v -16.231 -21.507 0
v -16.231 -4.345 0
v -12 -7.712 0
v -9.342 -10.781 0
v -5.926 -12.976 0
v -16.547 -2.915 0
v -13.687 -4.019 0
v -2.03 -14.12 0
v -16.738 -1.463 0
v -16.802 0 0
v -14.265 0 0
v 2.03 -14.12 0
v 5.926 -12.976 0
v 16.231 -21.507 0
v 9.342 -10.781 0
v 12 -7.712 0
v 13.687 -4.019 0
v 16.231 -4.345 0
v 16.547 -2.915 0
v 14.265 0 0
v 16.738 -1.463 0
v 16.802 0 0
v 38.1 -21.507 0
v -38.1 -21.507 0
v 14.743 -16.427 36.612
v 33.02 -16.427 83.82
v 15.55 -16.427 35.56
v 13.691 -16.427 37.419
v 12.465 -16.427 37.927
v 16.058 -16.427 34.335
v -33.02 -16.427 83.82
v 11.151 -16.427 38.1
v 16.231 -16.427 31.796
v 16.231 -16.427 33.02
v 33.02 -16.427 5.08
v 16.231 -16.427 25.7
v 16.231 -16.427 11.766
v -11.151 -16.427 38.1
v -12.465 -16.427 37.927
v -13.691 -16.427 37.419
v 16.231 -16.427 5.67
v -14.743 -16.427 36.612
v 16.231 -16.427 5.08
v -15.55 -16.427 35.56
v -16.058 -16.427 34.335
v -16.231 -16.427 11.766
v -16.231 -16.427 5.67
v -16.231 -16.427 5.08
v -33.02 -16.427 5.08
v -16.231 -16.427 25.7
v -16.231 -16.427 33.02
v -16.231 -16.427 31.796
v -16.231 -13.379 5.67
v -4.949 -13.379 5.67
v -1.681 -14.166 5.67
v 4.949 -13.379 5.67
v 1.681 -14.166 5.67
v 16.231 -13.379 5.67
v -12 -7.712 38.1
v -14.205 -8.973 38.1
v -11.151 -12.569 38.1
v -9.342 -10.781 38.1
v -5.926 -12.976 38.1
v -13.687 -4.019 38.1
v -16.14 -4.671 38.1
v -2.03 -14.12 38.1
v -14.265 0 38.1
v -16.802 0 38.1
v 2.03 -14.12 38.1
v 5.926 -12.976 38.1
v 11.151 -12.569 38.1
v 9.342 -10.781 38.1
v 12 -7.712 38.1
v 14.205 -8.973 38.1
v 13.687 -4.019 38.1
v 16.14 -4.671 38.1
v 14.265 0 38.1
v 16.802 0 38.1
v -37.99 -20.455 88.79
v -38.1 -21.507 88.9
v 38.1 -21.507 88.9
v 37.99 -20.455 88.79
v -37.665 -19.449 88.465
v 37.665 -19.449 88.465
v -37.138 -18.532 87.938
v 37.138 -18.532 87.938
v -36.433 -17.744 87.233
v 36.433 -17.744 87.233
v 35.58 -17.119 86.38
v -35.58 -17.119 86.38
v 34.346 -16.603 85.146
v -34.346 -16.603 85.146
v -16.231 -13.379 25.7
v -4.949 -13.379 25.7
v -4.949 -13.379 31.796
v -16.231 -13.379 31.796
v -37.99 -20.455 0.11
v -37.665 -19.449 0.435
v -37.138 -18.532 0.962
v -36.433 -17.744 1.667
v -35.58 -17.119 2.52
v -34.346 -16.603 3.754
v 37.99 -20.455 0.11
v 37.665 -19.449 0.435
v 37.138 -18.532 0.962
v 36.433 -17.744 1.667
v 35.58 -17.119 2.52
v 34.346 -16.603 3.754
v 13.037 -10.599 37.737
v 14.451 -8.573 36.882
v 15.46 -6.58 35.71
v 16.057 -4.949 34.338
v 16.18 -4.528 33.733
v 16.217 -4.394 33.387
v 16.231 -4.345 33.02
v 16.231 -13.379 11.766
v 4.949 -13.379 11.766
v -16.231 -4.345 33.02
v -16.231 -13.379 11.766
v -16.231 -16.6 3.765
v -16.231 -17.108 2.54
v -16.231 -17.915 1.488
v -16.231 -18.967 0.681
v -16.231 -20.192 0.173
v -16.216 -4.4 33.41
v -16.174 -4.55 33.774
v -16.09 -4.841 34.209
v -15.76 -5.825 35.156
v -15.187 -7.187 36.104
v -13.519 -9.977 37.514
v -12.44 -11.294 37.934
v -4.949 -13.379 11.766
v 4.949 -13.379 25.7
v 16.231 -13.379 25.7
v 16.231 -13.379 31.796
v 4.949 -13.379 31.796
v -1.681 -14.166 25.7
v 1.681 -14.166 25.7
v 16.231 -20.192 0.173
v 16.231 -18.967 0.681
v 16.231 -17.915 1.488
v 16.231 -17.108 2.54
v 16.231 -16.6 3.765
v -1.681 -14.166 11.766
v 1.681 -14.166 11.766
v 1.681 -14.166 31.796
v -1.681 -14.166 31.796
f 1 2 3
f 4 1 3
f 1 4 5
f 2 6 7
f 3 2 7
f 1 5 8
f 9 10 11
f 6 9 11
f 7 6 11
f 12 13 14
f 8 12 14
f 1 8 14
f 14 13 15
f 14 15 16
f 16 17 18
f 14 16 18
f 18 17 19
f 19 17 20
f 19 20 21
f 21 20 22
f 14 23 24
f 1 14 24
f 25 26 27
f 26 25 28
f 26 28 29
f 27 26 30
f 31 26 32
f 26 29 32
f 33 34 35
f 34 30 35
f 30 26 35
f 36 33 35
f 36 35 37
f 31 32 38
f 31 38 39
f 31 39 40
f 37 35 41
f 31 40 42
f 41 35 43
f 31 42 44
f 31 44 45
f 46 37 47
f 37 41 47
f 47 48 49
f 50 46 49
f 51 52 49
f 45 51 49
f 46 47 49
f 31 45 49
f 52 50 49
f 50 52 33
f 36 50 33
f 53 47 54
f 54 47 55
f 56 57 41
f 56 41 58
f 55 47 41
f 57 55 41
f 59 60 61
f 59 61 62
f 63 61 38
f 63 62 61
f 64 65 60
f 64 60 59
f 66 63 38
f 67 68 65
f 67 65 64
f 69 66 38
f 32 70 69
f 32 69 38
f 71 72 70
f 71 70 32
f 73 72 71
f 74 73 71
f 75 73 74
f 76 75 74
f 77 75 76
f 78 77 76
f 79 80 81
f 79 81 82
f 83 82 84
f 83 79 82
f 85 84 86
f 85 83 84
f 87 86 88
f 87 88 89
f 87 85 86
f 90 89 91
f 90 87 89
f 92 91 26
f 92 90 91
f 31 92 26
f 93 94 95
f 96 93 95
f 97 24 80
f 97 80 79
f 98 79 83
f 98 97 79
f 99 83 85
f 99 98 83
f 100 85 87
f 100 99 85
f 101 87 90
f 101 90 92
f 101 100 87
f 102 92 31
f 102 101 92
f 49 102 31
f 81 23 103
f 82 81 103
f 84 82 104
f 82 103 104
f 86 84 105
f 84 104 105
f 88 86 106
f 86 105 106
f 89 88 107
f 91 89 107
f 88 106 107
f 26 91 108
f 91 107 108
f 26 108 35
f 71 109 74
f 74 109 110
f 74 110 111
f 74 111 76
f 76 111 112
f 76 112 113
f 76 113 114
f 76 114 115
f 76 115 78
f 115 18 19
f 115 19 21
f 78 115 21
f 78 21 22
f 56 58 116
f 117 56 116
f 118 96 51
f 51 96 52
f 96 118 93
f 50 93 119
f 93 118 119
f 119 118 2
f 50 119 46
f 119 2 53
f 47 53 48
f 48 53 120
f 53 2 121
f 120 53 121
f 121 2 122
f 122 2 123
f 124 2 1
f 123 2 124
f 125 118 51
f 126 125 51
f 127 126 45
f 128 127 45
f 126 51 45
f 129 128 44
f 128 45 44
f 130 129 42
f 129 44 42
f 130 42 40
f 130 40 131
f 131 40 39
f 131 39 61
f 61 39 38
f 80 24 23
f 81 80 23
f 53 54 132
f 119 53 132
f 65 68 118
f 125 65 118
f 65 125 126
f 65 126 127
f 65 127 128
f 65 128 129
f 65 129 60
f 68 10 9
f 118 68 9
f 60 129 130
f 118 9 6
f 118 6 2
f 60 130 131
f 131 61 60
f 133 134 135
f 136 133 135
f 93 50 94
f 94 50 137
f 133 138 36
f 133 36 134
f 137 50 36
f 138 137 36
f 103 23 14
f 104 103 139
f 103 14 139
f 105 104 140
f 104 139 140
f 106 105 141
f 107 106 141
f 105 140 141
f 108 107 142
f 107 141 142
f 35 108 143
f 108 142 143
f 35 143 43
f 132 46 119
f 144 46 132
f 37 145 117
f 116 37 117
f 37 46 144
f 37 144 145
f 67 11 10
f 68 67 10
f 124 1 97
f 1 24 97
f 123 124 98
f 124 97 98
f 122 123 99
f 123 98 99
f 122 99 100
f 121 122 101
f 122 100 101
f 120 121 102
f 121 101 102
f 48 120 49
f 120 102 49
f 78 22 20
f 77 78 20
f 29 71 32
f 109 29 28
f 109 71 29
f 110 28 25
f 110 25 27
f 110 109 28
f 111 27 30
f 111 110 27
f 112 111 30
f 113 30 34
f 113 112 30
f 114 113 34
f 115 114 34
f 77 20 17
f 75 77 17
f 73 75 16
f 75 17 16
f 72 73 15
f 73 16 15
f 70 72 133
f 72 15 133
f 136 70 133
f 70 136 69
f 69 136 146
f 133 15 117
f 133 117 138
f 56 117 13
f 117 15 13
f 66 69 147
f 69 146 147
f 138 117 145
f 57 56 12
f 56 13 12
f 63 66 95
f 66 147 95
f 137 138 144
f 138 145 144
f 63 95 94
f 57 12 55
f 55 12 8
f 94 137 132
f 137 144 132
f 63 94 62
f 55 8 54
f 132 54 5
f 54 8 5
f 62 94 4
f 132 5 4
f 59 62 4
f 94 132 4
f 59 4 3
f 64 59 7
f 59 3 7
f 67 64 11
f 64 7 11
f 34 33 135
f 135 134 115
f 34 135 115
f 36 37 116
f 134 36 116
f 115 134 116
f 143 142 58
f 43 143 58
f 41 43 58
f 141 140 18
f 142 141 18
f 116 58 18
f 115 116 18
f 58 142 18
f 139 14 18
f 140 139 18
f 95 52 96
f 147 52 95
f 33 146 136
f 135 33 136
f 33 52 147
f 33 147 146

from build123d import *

# Parameters (mm, degrees)
F1_DEPTH = 88.9
F2_DEPTH = 38.1
F3_W     = 3.048
F3_H     = 6.096
F4_DEPTH = 76.201
F5_R     = 5.07999


# Not quite as in the source:
# - a fillet or chamfer is up to 0.001 mm smaller than in the source, because OpenCascade refuses the exact size


with BuildPart() as f1:
    # F0 (on Top) → F1 (new body)
    with BuildSketch(Plane.XY):
        Polygon((-3.5306826939, -16.4269548038), (-16.2306826939, -16.4269548038), (-38.1, -16.4269548038), (-38.1, -21.5069548038), (38.1, -21.5069548038), (38.1, -16.4269548038), (16.2306826939, -16.4269548038), (3.5306826939, -16.4269548038), align=None)
    extrude(amount=F1_DEPTH)

    # F0 (on Top) → F2 (join)
    with BuildSketch(Plane.XY):
        with BuildLine():
            ThreePointArc((14.265, 0), (0, -14.265), (-14.265, 0))
            Line((-14.265, 0), (-16.8021, 0))
            ThreePointArc((-16.8021, 0), (-16.6586331687, -2.1910055589), (-16.2306826939, -4.344594768))
            Line((-16.2306826939, -4.344594768), (-16.2306826939, -16.4269548038))
            Line((-16.2306826939, -16.4269548038), (-3.5306826939, -16.4269548038))
            Line((-3.5306826939, -16.4269548038), (3.5306826939, -16.4269548038))
            Line((3.5306826939, -16.4269548038), (16.2306826939, -16.4269548038))
            Line((16.2306826939, -16.4269548038), (16.2306826939, -4.344594768))
            ThreePointArc((16.2306826939, -4.344594768), (16.6586331687, -2.1910055589), (16.8021, 0))
            Line((16.8021, 0), (14.265, 0))
        make_face()
    extrude(amount=F2_DEPTH)

    # F3 (on face) → F4 (cut, through all)
    with BuildSketch(Plane.YZ.offset(38.1)):
        with Locations((-14.9029548038, 8.7181735593)):
            Rectangle(F3_W, F3_H)
        with Locations((-14.9029548038, 28.7483400475)):
            Rectangle(F3_W, F3_H)
    extrude(amount=-F4_DEPTH, mode=Mode.SUBTRACT)

    # F5 (radius 5.08 in the source; OpenCascade refuses exactly that, so slightly less here)
    f5_edges = [f1.edges().sort_by_distance(p)[0] for p in [
        (0, -16.426955, 88.9),
        (38.1, -16.426955, 44.45),
        (27.165341, -16.426955, 0),
        (-38.1, -16.426955, 44.45),
        (-27.165341, -16.426955, 0),
        (16.230683, -10.385775, 38.1),
        (-16.230683, -10.385775, 38.1),
    ]]
    fillet(f5_edges, radius=F5_R)


solid = f1.part
